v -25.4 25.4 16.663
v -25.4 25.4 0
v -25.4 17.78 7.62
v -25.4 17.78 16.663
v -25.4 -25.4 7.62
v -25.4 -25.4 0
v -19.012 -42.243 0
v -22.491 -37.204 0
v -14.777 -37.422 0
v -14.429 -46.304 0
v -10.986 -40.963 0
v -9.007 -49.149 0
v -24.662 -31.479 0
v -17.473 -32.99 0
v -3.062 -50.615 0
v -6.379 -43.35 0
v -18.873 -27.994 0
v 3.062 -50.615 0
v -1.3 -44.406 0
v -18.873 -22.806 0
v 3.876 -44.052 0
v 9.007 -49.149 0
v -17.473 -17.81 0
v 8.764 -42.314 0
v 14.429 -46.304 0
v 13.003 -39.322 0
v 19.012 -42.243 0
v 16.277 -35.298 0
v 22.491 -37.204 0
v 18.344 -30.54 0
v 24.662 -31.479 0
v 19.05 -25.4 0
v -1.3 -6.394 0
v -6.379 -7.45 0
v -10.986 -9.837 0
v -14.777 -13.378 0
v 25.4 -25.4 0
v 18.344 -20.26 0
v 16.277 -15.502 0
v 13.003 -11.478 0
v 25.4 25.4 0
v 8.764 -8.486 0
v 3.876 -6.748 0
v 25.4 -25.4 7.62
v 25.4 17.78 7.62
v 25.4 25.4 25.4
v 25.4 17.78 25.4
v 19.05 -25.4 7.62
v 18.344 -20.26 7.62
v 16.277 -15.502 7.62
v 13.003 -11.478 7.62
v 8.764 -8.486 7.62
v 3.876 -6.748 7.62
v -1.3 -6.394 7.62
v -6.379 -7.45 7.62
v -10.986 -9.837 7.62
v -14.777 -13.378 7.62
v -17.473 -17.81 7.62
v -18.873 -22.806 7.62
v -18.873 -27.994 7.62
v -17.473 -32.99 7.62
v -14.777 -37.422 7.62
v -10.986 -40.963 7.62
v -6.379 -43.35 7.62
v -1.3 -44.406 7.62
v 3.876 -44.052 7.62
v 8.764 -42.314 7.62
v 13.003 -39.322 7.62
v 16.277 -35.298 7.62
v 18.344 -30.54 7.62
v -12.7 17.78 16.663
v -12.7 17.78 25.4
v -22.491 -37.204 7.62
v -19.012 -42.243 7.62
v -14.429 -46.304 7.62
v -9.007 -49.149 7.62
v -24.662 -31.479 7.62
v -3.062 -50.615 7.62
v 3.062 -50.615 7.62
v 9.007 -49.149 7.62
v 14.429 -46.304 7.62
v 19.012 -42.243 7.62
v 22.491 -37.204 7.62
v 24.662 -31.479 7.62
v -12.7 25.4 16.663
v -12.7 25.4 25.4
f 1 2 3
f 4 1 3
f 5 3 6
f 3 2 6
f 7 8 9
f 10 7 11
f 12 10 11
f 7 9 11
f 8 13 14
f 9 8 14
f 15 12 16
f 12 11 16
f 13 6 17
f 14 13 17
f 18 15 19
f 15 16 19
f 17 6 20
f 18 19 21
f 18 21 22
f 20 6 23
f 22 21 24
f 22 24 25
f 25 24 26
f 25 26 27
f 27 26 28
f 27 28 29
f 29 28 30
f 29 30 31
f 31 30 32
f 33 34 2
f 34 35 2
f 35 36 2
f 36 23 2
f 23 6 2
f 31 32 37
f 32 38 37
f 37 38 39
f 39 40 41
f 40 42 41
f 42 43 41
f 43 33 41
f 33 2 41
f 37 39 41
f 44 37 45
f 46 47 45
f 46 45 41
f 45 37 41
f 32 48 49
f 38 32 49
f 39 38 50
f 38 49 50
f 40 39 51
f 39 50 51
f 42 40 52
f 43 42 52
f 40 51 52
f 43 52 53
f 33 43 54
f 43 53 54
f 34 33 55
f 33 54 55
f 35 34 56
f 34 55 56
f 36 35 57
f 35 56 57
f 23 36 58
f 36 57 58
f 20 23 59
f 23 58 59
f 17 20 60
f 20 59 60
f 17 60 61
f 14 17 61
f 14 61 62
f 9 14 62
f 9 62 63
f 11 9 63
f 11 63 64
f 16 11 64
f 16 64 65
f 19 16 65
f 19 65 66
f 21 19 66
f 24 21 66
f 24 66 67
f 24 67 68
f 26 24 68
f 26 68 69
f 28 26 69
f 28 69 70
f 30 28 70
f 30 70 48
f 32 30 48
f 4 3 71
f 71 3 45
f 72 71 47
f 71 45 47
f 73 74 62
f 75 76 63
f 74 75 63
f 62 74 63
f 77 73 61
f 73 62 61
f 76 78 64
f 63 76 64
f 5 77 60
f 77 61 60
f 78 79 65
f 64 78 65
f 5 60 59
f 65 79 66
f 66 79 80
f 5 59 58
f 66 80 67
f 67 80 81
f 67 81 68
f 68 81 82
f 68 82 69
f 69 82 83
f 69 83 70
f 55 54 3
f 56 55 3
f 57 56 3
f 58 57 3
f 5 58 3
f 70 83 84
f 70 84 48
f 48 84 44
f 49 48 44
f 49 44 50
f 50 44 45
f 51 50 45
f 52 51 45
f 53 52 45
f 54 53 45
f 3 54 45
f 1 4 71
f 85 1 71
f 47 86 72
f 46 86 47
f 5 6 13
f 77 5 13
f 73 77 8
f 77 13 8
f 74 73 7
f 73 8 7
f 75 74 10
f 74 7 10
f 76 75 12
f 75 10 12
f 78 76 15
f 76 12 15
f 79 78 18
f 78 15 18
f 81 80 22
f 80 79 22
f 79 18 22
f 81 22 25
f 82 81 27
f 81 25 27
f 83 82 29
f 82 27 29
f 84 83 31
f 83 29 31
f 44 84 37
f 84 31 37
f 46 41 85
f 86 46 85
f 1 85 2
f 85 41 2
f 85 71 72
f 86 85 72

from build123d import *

# Parameters (mm, degrees)
F1_DEPTH = 25.4
F2_W     = 43.18
F2_H     = 17.78
F3_DEPTH = 50.801
F4_W     = 12.7
F4_H     = 8.7366292986
F5_DEPTH = 7.621
F6_R     = 19.05
F7_DEPTH = 7.621


with BuildPart() as f1:
    # F0 (on Top) → F1 (new body)
    with BuildSketch(Plane.XY):
        with BuildLine():
            Line((25.4, 25.4), (-25.4, 25.4))
            Line((-25.4, 25.4), (-25.4, -25.4))
            ThreePointArc((-25.4, -25.4), (0, -50.8), (25.4, -25.4))
            Line((25.4, -25.4), (25.4, 25.4))
        make_face()
    extrude(amount=F1_DEPTH)

    # F2 (on face) → F3 (cut, through all)
    with BuildSketch(Plane.YZ.offset(25.4)):
        with Locations((-3.81, 16.51)):
            Rectangle(F2_W, F2_H)
        Polygon((17.78, 33.02), (-60.672249645, 33.02), (-60.672249645, 7.62), (-25.4, 7.62), (-25.4, 25.4), (17.78, 25.4), align=None)
    extrude(amount=-F3_DEPTH, mode=Mode.SUBTRACT)

    # F4 (on face) → F5 (cut, through all)
    with BuildSketch(Plane.XZ.offset(-17.78)):
        with Locations((-19.05, 21.0316853507)):
            Rectangle(F4_W, F4_H)
    extrude(amount=-F5_DEPTH, mode=Mode.SUBTRACT)

    # F6 (on face) → F7 (cut, through all)
    with BuildSketch(Plane.XY.offset(7.62)):
        with Locations((0, -25.4)):
            Circle(F6_R)
    extrude(amount=-F7_DEPTH, mode=Mode.SUBTRACT)


solid = f1.part
